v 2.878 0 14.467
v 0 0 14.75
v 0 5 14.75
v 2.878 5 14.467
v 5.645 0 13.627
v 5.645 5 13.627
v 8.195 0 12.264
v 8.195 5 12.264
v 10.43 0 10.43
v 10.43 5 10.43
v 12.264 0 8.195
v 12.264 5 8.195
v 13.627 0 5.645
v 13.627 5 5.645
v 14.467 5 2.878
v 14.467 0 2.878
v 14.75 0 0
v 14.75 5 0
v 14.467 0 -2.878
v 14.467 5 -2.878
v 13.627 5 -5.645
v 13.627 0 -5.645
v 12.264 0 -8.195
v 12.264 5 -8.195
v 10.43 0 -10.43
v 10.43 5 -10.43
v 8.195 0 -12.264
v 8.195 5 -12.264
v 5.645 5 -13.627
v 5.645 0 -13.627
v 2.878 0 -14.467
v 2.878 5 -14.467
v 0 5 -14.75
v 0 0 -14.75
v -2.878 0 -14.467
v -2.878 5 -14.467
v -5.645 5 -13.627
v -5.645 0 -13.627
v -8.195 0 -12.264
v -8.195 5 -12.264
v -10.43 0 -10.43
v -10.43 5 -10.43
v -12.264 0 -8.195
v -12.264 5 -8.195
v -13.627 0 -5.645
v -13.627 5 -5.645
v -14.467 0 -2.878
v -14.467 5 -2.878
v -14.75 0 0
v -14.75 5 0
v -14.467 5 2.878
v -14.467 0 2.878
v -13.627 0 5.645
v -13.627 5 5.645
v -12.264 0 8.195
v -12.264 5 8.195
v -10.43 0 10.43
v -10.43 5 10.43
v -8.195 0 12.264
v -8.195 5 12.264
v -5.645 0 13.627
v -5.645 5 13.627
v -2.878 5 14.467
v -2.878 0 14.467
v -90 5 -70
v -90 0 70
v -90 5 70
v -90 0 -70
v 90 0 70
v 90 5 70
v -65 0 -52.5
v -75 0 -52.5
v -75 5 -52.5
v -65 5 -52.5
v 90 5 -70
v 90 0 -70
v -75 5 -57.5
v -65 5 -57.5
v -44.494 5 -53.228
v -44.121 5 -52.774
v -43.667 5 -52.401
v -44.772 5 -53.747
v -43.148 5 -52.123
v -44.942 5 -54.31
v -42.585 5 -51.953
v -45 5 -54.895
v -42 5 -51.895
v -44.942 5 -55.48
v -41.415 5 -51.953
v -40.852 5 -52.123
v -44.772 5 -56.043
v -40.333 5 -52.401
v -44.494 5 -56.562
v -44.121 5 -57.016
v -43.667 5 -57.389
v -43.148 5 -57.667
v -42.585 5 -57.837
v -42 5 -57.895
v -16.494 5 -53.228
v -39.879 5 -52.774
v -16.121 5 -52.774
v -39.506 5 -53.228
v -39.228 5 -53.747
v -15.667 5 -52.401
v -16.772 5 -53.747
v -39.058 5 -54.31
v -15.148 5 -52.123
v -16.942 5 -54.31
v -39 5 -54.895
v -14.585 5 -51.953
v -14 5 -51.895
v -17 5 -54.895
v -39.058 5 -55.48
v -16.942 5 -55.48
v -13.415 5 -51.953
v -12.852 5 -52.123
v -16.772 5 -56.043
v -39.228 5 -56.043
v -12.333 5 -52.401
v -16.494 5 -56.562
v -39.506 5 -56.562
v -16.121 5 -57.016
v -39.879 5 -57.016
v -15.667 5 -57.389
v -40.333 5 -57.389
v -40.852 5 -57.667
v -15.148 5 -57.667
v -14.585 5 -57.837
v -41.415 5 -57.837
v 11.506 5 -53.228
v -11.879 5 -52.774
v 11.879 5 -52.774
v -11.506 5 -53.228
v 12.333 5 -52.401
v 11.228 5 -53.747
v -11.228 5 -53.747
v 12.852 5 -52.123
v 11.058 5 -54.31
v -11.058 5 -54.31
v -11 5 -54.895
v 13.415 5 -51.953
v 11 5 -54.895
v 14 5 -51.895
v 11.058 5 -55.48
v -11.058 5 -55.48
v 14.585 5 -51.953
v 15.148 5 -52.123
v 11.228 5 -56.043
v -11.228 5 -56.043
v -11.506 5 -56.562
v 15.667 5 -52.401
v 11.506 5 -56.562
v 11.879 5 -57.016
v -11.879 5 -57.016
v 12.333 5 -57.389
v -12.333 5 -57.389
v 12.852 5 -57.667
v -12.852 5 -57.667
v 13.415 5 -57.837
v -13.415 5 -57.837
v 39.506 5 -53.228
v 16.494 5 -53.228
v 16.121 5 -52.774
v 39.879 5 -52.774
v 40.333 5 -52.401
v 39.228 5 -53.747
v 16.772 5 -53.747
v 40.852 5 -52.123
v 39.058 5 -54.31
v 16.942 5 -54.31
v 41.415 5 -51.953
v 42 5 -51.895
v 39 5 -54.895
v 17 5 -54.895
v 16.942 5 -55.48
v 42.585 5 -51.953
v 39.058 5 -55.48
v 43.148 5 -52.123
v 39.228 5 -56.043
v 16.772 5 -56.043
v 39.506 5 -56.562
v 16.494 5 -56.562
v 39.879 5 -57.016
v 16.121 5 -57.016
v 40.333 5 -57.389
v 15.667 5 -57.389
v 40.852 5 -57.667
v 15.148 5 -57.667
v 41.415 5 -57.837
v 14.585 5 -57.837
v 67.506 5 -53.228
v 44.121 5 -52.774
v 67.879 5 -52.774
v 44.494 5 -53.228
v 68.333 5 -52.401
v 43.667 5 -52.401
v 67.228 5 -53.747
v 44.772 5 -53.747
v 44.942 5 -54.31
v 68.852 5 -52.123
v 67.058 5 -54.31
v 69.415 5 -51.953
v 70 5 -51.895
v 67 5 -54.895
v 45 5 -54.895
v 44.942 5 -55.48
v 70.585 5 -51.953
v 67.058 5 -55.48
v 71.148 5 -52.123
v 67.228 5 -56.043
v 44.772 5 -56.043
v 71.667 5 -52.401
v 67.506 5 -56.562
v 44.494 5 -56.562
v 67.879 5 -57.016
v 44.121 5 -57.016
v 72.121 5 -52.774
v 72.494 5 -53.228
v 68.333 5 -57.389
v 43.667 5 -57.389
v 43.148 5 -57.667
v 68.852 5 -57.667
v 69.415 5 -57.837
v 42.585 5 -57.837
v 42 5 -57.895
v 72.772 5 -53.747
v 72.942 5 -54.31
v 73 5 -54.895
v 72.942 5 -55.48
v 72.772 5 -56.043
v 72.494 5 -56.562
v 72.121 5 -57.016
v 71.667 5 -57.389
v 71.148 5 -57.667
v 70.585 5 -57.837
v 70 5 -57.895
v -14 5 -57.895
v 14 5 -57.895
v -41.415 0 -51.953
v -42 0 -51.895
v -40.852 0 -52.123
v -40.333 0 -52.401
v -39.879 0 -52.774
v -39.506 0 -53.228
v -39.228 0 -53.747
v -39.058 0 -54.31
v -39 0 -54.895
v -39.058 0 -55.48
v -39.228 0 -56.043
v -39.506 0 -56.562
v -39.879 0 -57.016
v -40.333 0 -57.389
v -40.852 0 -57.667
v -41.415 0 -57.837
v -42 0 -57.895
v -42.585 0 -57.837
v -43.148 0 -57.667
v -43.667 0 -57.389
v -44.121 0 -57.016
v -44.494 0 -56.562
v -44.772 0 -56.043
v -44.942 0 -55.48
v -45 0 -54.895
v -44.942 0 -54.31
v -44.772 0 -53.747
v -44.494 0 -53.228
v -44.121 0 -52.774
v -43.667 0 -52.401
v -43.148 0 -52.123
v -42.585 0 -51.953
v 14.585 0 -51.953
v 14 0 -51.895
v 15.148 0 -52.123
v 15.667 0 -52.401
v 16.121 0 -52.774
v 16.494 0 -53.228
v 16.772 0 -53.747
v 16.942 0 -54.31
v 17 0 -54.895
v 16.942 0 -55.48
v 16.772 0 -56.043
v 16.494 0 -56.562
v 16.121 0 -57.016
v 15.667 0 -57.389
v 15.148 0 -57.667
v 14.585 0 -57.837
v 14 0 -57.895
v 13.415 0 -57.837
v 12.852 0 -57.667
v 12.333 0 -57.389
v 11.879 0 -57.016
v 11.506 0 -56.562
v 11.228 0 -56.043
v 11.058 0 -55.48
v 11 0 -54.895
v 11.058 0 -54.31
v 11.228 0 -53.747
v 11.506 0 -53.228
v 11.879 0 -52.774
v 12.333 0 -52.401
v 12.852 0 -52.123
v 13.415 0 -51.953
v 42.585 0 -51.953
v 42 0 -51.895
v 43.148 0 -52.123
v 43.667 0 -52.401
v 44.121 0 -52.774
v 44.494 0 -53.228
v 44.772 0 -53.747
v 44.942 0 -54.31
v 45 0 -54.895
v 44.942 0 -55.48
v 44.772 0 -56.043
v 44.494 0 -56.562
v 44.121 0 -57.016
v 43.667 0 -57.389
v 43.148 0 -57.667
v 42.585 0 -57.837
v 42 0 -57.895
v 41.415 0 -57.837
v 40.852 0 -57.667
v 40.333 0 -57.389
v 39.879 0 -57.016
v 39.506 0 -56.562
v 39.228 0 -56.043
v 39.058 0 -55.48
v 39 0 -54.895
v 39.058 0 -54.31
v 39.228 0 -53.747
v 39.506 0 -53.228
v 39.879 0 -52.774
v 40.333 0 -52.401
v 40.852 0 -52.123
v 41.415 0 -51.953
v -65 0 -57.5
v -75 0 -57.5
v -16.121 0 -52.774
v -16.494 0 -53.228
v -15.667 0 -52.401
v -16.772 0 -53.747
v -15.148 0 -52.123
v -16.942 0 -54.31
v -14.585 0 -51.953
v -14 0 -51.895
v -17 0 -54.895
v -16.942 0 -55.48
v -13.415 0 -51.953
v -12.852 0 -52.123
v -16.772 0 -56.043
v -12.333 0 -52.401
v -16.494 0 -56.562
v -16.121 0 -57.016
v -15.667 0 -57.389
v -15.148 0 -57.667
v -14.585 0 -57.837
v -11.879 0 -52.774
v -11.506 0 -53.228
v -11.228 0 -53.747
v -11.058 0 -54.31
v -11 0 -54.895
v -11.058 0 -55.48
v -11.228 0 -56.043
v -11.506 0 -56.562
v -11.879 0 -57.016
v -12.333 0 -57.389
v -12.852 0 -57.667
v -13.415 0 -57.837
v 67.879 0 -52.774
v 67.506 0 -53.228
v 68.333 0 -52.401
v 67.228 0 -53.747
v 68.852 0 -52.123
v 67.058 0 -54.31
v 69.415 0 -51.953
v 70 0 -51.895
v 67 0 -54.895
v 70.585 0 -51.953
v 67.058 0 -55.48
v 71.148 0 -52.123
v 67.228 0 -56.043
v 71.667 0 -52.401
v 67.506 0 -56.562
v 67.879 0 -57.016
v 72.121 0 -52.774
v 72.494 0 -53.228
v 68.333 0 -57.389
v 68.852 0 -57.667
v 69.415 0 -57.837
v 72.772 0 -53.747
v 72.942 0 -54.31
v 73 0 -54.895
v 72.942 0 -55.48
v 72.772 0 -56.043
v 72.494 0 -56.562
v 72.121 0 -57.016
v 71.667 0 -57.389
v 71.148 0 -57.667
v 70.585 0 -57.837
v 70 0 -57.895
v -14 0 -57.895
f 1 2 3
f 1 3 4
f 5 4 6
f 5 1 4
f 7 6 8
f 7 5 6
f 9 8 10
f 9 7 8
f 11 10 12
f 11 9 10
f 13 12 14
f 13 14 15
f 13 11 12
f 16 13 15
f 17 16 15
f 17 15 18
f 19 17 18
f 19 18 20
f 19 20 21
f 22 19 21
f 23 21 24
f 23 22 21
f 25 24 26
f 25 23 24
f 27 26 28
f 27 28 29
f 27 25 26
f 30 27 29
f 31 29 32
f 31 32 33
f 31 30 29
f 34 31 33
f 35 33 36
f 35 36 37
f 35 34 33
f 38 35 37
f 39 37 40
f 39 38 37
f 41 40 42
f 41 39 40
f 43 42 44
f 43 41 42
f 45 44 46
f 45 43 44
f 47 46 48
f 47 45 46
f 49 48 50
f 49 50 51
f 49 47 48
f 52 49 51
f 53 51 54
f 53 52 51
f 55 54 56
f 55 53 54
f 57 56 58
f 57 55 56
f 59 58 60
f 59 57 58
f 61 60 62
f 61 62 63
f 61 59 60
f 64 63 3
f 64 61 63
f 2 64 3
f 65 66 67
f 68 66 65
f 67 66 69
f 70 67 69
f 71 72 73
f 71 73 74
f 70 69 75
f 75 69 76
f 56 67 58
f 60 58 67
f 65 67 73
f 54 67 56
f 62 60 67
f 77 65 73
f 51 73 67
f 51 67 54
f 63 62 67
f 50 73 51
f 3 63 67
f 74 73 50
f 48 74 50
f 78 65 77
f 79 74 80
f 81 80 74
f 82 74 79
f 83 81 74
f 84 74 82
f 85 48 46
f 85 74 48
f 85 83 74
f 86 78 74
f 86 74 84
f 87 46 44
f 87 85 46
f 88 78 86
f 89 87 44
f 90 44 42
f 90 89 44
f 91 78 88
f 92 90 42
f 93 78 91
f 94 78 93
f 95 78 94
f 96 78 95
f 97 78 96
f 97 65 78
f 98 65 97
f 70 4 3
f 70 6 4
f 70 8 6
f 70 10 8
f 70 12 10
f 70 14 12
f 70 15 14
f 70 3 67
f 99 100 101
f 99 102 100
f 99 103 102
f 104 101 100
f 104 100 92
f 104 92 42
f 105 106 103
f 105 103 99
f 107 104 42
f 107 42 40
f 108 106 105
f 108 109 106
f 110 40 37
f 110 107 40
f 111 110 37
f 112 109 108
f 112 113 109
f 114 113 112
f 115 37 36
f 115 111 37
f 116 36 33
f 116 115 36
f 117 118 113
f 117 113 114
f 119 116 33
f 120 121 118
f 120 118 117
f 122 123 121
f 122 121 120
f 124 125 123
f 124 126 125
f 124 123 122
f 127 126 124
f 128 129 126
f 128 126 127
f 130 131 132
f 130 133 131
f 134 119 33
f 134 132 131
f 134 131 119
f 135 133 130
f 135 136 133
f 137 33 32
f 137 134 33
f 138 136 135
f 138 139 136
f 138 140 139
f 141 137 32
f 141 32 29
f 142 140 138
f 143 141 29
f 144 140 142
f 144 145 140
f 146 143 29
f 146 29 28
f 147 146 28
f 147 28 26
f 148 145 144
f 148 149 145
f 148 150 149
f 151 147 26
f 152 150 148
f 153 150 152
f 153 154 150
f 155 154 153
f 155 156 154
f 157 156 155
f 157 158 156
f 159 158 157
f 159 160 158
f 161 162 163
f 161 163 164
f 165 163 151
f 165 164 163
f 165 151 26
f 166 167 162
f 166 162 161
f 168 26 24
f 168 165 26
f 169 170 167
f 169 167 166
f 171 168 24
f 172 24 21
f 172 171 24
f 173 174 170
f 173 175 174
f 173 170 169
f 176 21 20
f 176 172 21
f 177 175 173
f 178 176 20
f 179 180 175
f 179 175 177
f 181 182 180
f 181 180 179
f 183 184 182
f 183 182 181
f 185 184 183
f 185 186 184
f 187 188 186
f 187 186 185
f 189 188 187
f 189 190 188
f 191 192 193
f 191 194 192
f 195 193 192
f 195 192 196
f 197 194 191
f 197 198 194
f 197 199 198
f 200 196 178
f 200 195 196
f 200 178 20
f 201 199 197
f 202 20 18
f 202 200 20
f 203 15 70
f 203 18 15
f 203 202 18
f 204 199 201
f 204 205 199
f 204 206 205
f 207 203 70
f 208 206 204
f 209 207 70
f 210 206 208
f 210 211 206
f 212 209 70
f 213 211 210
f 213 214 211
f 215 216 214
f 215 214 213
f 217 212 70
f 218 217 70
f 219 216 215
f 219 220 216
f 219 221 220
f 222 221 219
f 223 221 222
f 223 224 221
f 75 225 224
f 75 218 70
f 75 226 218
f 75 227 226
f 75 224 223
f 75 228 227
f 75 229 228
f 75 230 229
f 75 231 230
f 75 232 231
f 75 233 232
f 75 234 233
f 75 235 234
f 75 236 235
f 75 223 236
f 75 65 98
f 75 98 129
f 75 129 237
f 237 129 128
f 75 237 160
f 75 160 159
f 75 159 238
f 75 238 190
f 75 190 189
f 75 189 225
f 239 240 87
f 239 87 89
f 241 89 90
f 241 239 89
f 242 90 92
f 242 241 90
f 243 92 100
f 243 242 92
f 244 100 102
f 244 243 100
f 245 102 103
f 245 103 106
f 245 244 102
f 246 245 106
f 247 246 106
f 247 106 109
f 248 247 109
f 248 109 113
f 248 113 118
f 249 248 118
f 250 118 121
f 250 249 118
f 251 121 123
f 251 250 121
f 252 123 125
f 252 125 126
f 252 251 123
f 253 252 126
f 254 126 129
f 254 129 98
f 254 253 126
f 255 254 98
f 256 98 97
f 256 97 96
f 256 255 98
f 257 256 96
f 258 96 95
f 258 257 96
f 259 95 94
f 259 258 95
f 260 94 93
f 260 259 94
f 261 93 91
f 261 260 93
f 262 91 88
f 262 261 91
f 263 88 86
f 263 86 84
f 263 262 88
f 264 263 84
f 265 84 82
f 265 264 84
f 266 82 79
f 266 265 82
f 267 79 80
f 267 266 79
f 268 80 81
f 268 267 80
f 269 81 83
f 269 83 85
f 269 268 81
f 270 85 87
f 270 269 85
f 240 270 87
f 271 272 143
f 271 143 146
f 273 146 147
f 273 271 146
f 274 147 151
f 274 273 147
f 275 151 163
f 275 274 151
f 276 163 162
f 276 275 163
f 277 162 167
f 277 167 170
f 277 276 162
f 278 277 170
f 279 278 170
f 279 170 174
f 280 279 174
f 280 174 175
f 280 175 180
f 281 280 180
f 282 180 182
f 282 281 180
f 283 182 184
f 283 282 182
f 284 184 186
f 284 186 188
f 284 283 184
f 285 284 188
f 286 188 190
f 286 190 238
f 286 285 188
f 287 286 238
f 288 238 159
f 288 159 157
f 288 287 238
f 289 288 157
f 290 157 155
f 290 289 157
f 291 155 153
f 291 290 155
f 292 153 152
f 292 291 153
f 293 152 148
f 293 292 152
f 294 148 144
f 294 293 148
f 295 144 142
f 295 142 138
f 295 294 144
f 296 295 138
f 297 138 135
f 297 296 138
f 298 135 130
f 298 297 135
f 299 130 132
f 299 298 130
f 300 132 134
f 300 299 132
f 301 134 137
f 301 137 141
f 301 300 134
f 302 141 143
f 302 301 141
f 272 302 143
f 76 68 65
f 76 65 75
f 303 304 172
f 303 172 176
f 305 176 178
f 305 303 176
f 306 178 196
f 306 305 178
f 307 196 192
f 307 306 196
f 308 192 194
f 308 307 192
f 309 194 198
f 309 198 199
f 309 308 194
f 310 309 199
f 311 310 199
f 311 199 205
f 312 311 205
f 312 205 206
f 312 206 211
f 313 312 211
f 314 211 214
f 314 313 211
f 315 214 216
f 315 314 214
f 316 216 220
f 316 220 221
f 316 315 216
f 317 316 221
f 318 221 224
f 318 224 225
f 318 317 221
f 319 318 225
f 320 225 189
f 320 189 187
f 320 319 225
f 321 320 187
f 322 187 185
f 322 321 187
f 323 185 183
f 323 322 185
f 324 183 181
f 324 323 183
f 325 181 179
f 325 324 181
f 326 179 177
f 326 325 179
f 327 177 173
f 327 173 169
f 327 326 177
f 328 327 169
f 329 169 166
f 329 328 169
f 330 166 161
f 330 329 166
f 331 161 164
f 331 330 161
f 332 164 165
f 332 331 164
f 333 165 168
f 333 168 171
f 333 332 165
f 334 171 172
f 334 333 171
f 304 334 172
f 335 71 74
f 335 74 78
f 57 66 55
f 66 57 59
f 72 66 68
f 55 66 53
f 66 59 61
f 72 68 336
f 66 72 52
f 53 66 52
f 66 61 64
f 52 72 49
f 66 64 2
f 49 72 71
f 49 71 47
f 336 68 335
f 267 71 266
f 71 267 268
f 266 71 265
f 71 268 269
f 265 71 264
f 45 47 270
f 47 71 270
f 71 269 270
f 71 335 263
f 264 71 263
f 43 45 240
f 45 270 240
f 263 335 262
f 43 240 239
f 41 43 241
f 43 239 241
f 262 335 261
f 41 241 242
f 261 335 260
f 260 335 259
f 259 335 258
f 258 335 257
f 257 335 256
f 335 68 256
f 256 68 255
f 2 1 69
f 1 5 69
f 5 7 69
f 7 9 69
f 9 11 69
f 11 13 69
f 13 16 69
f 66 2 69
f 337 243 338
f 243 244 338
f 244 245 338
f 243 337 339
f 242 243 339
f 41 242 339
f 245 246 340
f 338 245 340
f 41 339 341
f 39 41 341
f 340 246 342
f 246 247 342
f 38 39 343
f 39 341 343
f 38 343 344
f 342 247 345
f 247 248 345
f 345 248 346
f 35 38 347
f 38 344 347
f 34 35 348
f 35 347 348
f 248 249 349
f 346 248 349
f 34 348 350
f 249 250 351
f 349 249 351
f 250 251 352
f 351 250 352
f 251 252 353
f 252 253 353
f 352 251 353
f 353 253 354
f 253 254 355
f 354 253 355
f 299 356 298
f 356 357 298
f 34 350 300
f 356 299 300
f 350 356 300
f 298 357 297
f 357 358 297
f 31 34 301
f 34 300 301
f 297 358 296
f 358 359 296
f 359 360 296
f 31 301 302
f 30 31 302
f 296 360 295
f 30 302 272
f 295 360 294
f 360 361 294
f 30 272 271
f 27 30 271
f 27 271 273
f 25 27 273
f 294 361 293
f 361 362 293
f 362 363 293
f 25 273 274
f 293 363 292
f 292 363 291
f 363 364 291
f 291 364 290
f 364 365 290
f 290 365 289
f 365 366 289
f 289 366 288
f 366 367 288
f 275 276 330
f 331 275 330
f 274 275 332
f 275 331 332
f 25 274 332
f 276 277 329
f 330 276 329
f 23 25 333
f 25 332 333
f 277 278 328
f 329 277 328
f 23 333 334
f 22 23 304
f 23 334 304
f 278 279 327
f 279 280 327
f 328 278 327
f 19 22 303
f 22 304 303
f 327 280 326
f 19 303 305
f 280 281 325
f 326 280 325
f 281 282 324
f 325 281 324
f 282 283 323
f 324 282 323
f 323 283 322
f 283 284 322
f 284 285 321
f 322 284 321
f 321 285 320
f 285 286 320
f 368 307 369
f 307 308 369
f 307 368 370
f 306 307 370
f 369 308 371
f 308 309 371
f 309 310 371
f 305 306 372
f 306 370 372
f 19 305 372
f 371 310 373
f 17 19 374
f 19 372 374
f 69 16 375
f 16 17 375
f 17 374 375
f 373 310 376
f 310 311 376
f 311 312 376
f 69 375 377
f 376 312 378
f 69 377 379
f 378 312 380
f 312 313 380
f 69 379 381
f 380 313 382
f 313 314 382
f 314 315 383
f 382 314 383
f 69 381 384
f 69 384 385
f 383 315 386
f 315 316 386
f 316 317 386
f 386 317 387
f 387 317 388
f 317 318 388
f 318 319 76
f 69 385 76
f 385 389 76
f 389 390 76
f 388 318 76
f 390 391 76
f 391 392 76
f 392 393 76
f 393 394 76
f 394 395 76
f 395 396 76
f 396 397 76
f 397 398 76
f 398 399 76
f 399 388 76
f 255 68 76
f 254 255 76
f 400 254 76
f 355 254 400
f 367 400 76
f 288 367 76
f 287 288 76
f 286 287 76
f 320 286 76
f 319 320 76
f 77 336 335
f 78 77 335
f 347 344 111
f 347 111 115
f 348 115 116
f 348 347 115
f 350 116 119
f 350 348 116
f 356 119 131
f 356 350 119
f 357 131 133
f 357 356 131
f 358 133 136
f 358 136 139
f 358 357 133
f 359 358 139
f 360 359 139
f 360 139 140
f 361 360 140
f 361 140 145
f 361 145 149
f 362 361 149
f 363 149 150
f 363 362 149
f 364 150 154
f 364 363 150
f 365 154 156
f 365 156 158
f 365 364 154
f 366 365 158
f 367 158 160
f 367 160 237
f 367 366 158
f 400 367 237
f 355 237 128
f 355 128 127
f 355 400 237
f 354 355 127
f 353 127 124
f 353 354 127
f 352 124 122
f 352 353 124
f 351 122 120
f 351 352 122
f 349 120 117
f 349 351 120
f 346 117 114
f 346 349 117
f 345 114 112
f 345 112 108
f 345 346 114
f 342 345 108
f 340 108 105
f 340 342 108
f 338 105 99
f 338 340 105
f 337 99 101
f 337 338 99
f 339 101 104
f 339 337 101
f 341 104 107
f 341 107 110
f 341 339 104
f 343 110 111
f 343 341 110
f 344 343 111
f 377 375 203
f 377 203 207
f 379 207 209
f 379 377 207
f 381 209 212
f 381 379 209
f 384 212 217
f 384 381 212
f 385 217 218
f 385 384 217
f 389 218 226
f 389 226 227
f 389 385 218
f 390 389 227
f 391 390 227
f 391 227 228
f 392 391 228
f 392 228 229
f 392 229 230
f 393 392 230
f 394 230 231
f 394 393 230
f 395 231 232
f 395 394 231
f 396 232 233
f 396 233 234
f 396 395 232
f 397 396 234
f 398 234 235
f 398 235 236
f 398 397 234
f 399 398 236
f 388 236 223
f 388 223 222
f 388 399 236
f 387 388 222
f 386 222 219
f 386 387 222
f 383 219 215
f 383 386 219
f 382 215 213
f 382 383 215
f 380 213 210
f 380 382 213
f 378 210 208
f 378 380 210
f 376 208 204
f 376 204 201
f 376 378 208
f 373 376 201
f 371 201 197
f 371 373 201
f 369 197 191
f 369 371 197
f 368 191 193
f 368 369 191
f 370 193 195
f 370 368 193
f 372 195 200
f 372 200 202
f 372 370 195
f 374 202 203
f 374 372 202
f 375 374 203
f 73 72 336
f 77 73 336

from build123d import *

# Parameters (mm, degrees)
IZIM1_W                     = 180
IZIM1_H                     = 140
IZIM1_R                     = 14.75
IZIM1_R_2                   = 3
IZIM1_W_2                   = 10
IZIM1_H_2                   = 5
Y_KSEKLIK_EKSTR_ZYON1_DEPTH = 5


with BuildPart() as part:
    # Çizim1 → Yükseklik-Ekstrüzyon1 (new body)
    with BuildSketch(Plane(origin=(0, 0, 0), x_dir=(1, 0, 0), z_dir=(0, 1, 0))):
        Rectangle(IZIM1_W, IZIM1_H)
        with Locations(Location((0, 0, 0), (0, 0, 270))):
            Circle(IZIM1_R, mode=Mode.SUBTRACT)
        with Locations(Location((70, 54.895079595, 0), (0, 0, 270))):
            Circle(IZIM1_R_2, mode=Mode.SUBTRACT)
        with Locations(Location((42, 54.895079595, 0), (0, 0, 270))):
            Circle(IZIM1_R_2, mode=Mode.SUBTRACT)
        with Locations(Location((14, 54.895079595, 0), (0, 0, 270))):
            Circle(IZIM1_R_2, mode=Mode.SUBTRACT)
        with Locations(Location((-14, 54.895079595, 0), (0, 0, 270))):
            Circle(IZIM1_R_2, mode=Mode.SUBTRACT)
        with Locations(Location((-42, 54.895079595, 0), (0, 0, 270))):
            Circle(IZIM1_R_2, mode=Mode.SUBTRACT)
        with Locations((-70, 55)):
            Rectangle(IZIM1_W_2, IZIM1_H_2, mode=Mode.SUBTRACT)
    extrude(amount=Y_KSEKLIK_EKSTR_ZYON1_DEPTH)


solid = part.part
